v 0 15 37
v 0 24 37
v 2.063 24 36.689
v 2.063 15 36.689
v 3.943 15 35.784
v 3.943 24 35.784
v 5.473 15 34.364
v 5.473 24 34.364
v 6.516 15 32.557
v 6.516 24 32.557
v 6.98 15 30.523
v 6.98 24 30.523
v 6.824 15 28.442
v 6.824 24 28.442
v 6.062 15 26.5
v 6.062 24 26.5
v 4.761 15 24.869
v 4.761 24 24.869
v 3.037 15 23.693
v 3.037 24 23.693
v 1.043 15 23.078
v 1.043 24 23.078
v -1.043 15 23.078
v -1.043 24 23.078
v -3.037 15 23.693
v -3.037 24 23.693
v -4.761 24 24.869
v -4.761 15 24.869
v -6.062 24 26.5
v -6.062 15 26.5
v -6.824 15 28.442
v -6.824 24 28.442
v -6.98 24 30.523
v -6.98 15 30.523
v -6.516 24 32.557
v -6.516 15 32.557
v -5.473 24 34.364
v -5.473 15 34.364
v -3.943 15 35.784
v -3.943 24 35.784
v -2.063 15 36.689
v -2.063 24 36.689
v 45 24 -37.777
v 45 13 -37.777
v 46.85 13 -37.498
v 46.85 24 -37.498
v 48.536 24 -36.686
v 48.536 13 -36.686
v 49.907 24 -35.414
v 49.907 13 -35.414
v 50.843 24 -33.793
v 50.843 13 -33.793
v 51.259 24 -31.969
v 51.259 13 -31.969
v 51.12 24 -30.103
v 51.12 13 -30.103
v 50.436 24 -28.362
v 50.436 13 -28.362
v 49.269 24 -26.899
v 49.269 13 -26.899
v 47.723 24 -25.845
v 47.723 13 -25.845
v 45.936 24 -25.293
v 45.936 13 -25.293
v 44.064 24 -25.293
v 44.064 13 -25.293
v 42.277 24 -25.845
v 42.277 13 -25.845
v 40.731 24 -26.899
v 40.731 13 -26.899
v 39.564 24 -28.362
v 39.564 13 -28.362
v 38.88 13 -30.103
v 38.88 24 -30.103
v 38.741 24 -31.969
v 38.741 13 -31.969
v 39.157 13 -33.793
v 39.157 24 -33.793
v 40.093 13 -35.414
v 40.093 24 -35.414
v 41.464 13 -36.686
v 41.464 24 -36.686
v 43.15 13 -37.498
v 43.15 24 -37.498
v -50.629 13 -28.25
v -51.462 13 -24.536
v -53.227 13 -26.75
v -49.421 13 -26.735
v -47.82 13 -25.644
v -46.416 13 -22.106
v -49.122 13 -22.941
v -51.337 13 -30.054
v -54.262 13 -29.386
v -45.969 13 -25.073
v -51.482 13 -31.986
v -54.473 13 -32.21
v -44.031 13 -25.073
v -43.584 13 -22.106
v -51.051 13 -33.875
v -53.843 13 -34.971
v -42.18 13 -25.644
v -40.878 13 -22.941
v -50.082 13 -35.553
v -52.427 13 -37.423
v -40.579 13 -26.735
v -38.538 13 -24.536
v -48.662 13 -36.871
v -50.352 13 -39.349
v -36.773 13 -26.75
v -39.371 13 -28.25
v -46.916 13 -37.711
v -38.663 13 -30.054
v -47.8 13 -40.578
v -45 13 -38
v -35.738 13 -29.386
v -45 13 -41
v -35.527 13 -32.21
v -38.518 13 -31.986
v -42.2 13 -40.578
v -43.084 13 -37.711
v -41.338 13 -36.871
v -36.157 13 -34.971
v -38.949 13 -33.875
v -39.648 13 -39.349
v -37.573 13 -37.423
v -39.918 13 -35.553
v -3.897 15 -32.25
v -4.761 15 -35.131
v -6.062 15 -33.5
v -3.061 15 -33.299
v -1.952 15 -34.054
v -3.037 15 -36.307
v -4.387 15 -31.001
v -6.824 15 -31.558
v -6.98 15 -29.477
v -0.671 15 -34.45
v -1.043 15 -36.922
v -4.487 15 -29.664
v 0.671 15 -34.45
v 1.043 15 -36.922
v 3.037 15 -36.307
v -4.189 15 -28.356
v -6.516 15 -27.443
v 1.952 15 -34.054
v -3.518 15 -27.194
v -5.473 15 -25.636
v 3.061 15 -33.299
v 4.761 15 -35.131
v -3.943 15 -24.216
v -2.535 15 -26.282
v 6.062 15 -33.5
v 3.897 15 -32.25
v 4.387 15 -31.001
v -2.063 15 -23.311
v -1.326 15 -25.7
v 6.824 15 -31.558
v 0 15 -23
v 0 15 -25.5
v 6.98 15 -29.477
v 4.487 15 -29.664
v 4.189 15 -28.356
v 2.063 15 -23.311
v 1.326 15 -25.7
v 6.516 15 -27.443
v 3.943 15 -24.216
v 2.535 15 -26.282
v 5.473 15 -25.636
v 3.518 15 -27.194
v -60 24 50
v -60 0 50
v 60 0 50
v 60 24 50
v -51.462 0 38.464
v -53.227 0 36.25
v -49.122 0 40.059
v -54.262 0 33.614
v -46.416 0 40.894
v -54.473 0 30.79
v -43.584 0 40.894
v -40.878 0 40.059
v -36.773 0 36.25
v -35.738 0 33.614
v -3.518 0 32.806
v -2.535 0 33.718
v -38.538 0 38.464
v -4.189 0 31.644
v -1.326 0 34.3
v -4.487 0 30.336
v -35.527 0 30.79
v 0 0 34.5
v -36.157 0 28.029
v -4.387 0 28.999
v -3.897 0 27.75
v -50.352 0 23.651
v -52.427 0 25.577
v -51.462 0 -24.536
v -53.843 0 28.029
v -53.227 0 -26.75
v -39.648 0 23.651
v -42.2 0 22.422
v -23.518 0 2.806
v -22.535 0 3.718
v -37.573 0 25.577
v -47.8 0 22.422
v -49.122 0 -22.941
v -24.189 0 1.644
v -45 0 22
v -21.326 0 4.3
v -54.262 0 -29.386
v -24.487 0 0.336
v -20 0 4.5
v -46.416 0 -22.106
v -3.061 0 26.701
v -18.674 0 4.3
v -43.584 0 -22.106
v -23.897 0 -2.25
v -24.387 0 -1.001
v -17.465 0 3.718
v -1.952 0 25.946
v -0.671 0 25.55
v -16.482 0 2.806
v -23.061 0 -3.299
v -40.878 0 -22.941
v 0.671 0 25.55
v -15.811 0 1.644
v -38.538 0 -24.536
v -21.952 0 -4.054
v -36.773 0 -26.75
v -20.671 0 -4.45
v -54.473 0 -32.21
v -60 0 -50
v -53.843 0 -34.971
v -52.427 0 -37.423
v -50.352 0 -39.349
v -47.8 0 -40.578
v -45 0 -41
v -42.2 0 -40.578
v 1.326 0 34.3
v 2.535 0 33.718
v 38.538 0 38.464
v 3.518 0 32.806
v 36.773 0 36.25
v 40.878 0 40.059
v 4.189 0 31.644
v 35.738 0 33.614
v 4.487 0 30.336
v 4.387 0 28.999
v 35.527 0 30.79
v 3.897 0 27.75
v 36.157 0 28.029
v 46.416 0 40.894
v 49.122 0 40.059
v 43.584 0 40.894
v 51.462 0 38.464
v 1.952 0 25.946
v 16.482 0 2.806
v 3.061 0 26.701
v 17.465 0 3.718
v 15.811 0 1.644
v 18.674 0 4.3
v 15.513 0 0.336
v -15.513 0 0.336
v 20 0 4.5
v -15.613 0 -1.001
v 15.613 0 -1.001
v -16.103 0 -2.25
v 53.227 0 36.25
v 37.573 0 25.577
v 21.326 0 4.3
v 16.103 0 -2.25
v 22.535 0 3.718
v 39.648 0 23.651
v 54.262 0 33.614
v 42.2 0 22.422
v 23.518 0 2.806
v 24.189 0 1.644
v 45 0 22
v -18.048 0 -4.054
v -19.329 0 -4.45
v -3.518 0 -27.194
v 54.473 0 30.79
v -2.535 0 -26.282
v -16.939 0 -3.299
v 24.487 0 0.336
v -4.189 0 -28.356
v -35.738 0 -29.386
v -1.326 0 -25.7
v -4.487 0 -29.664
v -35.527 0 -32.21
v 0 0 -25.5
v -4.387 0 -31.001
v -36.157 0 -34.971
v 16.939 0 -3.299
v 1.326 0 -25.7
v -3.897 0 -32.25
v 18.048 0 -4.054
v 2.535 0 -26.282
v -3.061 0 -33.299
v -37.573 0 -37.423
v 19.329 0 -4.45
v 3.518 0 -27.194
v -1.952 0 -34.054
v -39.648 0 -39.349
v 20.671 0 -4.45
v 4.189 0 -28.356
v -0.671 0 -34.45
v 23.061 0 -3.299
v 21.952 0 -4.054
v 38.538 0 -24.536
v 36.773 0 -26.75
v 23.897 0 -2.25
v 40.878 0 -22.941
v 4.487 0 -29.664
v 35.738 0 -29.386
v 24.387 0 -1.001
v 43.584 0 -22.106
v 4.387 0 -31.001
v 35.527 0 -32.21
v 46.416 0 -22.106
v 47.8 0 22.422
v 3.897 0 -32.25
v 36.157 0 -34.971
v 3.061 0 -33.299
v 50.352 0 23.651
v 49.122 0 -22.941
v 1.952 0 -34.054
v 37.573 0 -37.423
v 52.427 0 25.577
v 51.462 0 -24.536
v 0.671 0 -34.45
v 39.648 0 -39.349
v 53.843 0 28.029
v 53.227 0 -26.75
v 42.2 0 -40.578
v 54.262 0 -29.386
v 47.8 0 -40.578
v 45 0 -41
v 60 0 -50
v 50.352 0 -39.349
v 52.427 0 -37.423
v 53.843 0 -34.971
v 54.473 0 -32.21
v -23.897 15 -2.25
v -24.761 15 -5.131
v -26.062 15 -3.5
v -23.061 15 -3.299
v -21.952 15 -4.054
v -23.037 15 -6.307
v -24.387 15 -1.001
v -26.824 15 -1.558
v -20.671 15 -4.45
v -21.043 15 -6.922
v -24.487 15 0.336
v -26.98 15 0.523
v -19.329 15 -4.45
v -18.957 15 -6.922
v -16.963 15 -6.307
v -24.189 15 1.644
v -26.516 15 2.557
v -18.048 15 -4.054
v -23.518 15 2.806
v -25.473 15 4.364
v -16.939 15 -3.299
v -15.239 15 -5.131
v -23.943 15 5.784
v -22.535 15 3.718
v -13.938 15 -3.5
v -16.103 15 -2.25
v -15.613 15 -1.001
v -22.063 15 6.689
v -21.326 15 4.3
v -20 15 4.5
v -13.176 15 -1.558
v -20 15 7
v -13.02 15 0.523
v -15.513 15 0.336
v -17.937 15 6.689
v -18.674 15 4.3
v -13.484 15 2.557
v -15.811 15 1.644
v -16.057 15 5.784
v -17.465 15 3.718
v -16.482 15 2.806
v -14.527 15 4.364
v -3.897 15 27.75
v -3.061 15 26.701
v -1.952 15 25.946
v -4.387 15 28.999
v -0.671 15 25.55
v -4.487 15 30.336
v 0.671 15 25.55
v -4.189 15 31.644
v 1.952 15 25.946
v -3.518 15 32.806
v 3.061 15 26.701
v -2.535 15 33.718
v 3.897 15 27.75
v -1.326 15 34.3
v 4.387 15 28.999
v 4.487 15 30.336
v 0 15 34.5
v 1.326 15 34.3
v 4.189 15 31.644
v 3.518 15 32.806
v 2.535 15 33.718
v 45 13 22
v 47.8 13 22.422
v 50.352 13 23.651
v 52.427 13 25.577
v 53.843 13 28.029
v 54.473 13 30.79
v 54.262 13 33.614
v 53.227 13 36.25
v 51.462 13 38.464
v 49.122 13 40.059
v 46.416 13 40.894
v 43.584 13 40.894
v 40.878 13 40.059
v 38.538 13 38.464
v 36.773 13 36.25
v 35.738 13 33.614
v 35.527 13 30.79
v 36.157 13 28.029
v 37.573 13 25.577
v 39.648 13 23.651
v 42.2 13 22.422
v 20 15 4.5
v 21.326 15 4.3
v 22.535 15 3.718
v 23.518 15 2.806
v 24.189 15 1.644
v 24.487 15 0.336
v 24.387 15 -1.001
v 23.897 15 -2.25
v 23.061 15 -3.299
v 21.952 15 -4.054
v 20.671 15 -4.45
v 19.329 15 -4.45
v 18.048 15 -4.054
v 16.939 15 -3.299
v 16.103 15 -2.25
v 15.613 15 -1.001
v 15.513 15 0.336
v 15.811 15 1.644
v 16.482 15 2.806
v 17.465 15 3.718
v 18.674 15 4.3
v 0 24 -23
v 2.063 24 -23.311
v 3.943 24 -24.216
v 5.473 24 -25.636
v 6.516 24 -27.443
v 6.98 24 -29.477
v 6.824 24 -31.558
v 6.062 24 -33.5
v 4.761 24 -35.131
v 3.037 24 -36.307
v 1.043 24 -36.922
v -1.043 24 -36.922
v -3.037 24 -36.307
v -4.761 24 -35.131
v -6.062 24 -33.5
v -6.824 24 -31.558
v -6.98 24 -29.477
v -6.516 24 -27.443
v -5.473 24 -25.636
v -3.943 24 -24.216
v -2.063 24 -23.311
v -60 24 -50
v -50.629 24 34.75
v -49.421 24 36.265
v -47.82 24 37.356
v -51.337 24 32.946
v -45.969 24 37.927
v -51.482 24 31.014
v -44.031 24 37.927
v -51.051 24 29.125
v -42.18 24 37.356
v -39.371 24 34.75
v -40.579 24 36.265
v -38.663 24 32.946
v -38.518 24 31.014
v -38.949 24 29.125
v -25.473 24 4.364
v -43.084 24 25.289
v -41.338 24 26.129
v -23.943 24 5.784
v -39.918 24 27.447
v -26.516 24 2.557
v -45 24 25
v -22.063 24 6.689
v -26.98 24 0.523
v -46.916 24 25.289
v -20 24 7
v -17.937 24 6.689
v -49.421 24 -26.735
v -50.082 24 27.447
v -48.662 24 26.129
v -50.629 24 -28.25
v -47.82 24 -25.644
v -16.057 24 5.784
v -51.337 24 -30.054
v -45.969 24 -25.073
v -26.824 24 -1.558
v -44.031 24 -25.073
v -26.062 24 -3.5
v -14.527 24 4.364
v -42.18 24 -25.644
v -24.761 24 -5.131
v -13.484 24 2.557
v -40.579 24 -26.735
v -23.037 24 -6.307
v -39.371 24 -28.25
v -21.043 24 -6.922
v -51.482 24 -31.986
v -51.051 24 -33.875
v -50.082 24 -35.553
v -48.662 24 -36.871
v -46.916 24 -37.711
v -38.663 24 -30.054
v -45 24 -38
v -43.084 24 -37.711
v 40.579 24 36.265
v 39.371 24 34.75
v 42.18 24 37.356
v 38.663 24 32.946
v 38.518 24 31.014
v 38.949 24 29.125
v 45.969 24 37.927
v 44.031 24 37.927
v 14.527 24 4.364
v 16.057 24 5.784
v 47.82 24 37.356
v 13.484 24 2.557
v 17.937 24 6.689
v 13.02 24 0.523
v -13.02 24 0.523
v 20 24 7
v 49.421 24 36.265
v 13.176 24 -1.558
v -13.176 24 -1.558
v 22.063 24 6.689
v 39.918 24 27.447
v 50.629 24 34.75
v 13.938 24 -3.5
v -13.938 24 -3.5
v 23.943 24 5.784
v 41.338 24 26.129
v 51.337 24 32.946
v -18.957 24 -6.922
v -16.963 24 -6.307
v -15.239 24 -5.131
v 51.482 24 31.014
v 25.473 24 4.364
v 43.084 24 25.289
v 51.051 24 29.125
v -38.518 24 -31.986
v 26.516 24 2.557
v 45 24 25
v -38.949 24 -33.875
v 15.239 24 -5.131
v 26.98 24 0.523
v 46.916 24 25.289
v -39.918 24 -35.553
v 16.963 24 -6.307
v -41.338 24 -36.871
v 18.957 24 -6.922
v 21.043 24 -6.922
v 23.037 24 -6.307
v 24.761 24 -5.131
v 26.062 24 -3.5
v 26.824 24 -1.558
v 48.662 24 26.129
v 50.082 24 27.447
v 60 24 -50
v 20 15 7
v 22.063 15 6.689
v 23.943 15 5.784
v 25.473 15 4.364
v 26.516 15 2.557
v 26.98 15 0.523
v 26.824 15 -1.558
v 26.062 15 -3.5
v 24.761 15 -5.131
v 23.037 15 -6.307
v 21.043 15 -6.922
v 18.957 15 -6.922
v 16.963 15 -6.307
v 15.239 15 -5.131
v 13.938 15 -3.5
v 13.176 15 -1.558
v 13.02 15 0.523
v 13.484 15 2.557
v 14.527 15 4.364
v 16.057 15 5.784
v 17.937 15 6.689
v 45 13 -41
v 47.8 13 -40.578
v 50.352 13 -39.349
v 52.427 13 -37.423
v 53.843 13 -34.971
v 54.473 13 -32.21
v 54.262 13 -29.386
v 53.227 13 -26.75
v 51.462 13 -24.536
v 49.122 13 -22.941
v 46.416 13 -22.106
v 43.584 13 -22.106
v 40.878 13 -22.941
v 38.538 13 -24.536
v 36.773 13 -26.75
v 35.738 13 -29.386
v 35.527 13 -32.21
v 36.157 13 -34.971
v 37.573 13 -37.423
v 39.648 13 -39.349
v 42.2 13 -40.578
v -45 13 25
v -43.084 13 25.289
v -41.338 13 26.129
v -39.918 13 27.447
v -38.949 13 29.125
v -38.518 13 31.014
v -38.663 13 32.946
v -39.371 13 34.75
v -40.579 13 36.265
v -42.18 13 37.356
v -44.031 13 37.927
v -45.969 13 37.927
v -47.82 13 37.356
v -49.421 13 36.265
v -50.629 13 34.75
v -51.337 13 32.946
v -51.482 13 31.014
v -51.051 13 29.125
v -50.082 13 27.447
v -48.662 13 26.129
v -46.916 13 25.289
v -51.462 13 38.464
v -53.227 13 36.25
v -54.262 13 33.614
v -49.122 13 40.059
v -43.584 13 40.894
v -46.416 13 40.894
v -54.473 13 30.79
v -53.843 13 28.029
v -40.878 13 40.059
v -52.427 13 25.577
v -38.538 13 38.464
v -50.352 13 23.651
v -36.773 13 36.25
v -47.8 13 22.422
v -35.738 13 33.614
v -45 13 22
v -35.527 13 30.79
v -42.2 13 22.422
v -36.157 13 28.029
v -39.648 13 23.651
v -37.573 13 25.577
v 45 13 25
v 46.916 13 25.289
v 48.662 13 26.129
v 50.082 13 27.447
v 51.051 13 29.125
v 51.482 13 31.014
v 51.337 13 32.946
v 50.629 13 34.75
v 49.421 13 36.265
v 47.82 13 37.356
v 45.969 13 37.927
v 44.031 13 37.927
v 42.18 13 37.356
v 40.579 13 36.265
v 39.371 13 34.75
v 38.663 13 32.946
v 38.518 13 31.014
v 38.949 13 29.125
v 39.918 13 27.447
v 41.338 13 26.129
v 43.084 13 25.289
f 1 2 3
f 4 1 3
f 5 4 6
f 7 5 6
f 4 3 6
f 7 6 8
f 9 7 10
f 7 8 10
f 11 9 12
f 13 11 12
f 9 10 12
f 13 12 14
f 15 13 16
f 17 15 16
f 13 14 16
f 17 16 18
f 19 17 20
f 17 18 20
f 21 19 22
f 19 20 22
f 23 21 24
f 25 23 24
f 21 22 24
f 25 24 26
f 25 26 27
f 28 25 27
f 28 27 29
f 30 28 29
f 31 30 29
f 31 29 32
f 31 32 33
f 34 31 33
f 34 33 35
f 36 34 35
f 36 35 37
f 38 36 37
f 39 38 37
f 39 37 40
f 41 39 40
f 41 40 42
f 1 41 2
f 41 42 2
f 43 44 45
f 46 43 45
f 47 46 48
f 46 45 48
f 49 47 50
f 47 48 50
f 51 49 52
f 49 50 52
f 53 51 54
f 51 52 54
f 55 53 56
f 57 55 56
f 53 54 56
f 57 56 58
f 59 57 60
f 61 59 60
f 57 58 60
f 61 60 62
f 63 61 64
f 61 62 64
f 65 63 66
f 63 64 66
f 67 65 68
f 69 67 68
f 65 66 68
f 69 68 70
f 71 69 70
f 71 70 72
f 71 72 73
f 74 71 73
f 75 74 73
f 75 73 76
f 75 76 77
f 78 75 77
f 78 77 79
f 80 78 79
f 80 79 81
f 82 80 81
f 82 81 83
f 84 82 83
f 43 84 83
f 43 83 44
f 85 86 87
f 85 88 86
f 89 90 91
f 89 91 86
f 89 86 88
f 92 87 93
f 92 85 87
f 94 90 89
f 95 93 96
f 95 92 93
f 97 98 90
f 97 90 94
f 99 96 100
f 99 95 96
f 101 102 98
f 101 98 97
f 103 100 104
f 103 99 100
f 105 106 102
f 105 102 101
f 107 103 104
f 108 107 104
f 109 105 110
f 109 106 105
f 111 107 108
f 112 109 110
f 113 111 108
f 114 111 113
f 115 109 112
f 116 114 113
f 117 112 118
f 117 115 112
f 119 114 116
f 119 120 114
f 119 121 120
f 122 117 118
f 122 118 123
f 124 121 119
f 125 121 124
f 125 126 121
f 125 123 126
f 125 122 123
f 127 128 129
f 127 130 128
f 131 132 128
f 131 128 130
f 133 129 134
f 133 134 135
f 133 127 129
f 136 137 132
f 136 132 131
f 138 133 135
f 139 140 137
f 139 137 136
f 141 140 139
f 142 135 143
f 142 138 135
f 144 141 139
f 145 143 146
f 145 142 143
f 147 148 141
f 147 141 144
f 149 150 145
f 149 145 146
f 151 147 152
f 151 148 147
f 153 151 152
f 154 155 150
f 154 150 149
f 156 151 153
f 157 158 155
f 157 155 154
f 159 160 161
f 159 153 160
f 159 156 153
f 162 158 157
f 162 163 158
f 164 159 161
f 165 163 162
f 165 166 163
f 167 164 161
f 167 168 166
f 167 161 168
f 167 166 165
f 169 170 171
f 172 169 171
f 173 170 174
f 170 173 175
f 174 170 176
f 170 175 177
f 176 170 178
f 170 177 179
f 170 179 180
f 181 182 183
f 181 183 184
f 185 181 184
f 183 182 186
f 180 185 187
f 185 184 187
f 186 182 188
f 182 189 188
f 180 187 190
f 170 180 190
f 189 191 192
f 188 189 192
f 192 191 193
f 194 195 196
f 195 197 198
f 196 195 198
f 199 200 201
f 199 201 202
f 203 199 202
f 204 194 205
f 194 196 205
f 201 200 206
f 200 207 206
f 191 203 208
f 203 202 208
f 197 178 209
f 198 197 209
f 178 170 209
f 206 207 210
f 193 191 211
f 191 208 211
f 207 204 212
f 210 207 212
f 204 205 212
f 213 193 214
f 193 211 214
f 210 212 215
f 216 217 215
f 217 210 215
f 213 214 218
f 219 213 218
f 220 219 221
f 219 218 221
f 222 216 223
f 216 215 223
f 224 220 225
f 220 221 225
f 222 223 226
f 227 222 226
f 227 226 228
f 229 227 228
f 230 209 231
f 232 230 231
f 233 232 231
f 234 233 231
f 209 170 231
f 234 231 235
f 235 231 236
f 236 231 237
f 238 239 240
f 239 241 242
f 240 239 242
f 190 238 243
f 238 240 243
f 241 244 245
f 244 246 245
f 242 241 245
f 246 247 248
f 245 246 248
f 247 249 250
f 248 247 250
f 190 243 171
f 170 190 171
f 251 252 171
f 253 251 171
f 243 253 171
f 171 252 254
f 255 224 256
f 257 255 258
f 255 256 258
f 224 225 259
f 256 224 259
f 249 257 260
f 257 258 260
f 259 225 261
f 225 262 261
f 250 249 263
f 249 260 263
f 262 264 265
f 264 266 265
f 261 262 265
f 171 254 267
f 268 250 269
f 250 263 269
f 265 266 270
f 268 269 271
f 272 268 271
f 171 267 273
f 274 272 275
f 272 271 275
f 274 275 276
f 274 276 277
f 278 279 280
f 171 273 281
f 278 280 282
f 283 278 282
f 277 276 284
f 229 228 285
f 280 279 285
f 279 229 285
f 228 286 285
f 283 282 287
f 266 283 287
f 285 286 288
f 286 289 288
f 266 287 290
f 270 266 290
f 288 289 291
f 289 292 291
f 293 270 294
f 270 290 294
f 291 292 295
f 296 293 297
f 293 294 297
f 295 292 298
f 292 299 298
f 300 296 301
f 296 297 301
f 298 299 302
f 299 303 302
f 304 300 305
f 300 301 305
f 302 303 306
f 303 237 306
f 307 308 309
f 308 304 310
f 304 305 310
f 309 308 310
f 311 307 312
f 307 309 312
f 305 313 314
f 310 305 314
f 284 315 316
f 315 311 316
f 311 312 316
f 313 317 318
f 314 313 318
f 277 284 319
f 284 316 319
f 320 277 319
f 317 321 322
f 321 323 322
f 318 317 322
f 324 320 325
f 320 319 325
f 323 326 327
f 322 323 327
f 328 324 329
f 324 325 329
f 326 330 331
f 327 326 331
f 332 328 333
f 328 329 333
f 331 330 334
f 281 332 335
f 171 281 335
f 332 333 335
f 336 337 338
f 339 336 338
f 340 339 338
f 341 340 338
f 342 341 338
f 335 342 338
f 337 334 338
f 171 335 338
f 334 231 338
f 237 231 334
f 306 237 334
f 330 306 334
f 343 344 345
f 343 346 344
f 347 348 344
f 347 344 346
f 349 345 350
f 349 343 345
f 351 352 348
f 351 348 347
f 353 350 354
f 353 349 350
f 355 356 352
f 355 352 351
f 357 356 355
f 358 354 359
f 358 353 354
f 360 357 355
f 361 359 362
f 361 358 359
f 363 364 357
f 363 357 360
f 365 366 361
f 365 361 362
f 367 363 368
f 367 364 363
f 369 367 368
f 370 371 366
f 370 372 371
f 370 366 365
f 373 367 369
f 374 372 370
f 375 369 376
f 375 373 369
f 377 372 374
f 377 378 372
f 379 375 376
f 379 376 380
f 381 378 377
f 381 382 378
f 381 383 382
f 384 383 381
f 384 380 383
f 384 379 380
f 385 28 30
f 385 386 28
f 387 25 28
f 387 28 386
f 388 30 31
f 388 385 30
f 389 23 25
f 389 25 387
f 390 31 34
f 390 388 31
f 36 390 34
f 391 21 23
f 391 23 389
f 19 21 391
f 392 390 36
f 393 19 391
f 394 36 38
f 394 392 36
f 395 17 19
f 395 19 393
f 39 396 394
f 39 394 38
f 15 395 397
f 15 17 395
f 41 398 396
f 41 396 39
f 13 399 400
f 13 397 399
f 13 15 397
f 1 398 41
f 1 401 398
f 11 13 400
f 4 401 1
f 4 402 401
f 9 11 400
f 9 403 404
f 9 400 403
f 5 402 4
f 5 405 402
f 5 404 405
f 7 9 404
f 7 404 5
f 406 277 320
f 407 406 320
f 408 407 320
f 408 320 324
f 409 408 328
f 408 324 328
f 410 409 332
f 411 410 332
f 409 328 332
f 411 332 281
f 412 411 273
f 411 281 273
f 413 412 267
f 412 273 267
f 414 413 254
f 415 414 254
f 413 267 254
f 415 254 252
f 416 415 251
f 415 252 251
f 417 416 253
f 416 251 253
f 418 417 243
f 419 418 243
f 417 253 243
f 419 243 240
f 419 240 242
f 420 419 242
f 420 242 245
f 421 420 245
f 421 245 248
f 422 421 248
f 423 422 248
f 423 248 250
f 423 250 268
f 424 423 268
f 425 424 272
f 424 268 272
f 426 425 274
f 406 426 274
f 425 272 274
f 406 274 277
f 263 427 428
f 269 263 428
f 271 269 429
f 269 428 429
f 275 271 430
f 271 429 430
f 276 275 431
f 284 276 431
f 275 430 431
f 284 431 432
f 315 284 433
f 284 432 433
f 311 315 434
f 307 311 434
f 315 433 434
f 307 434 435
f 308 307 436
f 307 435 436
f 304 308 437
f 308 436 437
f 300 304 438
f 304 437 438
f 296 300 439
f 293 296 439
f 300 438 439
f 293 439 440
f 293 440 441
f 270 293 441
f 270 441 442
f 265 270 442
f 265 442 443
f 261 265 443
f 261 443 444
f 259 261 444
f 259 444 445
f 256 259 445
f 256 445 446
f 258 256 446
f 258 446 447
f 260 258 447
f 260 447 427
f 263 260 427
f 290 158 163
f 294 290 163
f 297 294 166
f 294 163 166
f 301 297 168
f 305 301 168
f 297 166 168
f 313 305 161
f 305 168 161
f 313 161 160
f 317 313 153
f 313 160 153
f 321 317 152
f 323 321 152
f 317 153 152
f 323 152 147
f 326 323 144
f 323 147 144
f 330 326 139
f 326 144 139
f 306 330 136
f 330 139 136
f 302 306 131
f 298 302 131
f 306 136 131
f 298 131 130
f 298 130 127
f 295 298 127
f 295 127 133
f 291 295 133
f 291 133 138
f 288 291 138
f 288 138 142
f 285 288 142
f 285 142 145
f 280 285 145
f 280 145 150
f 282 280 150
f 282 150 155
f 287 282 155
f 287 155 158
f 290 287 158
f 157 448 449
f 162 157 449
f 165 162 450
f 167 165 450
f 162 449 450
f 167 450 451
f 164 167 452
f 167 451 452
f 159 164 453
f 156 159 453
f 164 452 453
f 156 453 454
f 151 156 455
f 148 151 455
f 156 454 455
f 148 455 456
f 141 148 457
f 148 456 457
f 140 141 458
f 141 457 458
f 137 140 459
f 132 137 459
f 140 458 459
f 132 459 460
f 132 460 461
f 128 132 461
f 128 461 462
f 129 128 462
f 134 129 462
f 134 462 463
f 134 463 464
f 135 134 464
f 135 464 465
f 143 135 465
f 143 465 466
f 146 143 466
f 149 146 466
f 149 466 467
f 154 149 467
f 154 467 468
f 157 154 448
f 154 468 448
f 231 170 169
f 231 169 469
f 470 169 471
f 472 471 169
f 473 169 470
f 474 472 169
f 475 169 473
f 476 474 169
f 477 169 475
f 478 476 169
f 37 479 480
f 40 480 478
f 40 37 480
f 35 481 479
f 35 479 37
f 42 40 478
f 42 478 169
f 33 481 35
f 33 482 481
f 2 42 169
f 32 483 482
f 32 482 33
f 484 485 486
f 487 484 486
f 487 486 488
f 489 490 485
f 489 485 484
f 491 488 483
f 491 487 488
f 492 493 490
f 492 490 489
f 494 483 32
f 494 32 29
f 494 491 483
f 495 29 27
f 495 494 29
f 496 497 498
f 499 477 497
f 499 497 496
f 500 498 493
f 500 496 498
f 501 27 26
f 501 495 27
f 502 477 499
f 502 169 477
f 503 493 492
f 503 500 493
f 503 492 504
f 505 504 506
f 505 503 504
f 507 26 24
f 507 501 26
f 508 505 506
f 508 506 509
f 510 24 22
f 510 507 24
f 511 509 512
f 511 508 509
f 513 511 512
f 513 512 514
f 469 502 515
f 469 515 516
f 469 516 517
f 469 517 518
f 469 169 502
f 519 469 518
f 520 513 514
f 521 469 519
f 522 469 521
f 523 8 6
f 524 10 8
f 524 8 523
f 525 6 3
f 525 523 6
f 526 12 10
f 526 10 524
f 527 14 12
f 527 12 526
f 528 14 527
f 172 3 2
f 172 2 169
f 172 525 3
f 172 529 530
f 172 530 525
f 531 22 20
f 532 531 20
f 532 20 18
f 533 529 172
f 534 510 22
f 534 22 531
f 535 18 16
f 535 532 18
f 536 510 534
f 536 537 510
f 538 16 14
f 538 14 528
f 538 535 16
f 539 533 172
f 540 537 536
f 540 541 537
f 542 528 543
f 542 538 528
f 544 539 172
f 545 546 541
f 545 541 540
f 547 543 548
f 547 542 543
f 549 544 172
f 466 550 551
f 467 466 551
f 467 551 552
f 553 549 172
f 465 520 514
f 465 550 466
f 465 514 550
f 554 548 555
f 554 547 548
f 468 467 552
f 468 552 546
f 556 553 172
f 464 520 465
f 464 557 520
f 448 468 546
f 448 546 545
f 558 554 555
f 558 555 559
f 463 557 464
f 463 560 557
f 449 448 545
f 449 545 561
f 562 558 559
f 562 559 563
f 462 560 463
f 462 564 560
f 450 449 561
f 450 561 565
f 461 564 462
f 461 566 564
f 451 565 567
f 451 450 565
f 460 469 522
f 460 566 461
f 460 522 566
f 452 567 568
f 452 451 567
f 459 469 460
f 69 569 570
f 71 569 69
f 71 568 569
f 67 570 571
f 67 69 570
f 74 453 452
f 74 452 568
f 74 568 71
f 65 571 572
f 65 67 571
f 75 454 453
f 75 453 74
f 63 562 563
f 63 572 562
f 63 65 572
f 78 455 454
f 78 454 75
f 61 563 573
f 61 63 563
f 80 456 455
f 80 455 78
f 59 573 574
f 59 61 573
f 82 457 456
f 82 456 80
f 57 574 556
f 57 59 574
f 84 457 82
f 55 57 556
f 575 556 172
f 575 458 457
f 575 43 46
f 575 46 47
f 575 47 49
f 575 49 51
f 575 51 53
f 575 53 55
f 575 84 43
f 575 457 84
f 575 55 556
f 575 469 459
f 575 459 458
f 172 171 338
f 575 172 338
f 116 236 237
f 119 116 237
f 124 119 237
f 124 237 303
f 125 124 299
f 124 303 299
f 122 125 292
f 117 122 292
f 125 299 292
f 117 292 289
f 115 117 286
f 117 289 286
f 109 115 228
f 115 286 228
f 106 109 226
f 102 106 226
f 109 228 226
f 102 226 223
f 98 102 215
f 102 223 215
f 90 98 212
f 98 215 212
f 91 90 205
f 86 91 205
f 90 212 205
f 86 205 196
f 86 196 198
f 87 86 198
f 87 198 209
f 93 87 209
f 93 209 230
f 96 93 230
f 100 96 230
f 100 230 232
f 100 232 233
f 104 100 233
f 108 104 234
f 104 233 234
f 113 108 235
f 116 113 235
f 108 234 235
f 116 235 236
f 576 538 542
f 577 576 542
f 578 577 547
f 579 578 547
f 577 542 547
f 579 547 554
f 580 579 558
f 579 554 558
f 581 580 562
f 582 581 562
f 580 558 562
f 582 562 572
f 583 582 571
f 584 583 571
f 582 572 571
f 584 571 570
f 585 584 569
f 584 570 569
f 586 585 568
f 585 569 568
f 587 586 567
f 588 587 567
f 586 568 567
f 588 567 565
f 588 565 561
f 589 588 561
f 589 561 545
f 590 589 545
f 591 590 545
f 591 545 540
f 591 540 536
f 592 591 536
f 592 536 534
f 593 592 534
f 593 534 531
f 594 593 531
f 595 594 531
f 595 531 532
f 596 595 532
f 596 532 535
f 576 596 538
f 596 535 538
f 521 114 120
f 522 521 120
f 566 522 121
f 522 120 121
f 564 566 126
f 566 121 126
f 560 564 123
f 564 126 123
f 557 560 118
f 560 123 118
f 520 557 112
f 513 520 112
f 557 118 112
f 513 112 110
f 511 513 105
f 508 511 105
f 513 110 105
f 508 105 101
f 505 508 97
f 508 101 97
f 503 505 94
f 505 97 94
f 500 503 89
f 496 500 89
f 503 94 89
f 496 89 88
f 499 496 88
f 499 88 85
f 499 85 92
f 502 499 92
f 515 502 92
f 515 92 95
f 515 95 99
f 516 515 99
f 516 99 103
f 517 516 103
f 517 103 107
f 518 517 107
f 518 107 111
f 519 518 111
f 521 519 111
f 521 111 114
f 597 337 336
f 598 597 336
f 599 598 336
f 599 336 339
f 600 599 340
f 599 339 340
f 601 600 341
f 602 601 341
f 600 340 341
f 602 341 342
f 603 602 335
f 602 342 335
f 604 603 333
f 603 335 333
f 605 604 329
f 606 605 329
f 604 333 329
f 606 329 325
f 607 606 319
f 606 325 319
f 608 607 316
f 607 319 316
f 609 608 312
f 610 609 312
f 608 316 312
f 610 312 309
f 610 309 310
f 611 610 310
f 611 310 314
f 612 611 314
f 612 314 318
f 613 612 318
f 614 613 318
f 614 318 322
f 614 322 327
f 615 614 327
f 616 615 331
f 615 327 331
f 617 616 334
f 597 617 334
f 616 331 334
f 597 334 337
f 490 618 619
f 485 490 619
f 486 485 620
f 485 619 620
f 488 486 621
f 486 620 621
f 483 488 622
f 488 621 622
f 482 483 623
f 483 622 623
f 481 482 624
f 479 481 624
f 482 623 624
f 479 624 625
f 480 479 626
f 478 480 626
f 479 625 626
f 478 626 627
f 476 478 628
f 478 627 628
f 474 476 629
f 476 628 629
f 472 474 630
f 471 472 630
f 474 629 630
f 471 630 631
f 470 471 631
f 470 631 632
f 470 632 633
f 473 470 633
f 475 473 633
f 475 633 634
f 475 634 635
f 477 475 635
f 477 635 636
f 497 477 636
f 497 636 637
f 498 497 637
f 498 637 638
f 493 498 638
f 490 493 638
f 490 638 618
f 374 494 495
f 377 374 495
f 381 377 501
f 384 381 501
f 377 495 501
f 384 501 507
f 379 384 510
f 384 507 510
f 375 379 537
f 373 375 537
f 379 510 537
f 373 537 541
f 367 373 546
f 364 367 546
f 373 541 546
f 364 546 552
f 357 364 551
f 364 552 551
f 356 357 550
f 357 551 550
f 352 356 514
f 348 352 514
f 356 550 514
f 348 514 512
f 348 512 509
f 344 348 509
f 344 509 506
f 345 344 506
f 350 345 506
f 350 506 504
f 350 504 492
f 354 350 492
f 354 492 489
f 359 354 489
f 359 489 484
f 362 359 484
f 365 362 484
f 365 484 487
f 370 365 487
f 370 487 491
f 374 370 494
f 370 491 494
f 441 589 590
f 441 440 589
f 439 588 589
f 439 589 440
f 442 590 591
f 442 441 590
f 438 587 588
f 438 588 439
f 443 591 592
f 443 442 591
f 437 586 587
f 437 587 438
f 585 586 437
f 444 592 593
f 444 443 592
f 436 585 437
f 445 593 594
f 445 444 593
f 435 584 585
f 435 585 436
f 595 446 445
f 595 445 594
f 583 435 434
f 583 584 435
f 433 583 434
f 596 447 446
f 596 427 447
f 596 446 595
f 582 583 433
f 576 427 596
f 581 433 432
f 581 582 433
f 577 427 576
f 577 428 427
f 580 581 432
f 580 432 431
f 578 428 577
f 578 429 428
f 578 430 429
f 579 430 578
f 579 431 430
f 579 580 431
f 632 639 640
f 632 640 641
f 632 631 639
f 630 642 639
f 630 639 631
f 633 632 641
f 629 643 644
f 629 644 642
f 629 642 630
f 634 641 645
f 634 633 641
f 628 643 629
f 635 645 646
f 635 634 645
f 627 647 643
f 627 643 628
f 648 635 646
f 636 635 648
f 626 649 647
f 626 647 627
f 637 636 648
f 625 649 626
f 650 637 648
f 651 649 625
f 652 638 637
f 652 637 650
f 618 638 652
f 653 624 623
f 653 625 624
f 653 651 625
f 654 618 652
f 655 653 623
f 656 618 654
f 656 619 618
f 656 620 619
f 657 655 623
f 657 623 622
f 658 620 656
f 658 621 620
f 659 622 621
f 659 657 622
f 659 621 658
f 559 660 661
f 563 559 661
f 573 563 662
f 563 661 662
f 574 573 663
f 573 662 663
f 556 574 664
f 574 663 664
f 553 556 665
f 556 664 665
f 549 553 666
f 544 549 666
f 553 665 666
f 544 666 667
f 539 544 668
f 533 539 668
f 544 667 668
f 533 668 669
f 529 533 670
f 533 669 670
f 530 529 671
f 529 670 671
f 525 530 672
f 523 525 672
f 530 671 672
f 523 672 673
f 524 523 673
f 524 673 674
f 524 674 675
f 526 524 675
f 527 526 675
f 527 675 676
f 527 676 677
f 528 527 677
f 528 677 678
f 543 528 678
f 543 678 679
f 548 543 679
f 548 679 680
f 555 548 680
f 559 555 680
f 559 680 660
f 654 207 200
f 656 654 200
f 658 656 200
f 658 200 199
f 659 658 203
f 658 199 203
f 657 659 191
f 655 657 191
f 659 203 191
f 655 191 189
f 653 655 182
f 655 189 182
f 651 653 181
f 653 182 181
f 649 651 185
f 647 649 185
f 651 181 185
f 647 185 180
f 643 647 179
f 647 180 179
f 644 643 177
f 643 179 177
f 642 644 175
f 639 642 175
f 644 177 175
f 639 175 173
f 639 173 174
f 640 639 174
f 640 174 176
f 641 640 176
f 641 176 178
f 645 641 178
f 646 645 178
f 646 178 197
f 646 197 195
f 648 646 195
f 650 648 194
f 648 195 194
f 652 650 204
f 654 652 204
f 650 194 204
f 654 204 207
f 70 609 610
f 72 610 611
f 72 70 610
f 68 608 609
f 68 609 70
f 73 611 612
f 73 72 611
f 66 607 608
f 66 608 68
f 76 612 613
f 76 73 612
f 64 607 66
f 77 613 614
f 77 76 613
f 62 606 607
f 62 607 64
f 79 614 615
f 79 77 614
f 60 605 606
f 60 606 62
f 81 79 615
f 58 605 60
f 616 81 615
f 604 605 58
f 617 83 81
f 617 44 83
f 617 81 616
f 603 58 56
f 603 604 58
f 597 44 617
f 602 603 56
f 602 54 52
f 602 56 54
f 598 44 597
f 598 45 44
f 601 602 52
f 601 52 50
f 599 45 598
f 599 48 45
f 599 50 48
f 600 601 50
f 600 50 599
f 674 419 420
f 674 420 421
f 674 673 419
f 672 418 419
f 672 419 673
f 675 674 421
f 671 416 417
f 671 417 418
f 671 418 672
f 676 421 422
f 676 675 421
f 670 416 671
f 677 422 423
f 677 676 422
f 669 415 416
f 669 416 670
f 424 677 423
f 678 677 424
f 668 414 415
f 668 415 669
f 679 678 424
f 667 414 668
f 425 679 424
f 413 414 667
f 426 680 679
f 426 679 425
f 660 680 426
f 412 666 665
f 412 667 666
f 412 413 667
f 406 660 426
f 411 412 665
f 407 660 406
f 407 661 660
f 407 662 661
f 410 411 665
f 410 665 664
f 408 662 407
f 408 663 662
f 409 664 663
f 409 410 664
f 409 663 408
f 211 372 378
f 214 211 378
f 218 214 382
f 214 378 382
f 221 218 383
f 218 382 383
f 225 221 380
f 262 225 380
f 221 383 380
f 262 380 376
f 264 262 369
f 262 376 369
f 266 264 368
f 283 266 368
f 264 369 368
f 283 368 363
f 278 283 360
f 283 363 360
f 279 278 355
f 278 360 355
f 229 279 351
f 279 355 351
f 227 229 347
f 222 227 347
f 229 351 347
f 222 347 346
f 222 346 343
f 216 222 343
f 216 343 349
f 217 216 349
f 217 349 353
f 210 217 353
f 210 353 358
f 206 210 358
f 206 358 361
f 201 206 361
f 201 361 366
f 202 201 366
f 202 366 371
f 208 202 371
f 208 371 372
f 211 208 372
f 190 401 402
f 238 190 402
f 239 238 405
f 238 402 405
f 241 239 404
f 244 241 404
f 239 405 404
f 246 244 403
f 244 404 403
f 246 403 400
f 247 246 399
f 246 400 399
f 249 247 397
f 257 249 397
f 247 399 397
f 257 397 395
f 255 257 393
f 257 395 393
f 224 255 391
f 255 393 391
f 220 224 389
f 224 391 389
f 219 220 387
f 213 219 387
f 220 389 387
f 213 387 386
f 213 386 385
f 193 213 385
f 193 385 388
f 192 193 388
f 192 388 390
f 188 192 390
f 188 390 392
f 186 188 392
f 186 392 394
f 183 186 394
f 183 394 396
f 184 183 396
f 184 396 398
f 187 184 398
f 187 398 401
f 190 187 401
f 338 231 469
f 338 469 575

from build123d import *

# Parameters (mm, degrees)
CROQUIS1_W              = 120
CROQUIS1_H              = 100
SALIENTE_EXTRUIR1_DEPTH = 24
CROQUIS2_R              = 7
CORTAR_EXTRUIR1_DEPTH   = 9
CORTAR_EXTRUIR2_REACH   = 81.53
CROQUIS3_R              = 4.5
CROQUIS4_R              = 9.5
CORTAR_EXTRUIR3_DEPTH   = 13
CROQUIS5_R              = 6.5
CROQUIS5_R_2            = 6.276895532
CORTAR_EXTRUIR4_DEPTH   = 80.177016867


with BuildPart() as part:
    # Croquis1 → Saliente-Extruir1 (new body)
    with BuildSketch(Plane(origin=(0, 0, 0), x_dir=(1, 0, 0), z_dir=(0, 1, 0))):
        Rectangle(CROQUIS1_W, CROQUIS1_H)
    extrude(amount=SALIENTE_EXTRUIR1_DEPTH)

    # Croquis2 → Cortar-Extruir1 (cut)
    with BuildSketch(Plane(origin=(0, 24, 0), x_dir=(1, 0, 0), z_dir=(0, 1, 0))):
        with Locations(Location((0, 30, 0), (0, 0, 270))):
            Circle(CROQUIS2_R)
        with Locations(Location((0, -30, 0), (0, 0, 270))):
            Circle(CROQUIS2_R)
        with Locations(Location((-20, 0, 0), (0, 0, 270))):
            Circle(CROQUIS2_R)
        with Locations(Location((20, 0, 0), (0, 0, 270))):
            Circle(CROQUIS2_R)
    extrude(amount=-CORTAR_EXTRUIR1_DEPTH, mode=Mode.SUBTRACT)

    # Croquis3 → Cortar-Extruir2 (cut, up to next)
    with BuildSketch(Plane(origin=(0, 15, 0), x_dir=(1, 0, 0), z_dir=(0, 1, 0)), mode=Mode.PRIVATE) as cortar_extruir2_sk1:
        with Locations(Location((-20, 0, 0), (0, 0, 270))):
            Circle(CROQUIS3_R)
    cortar_extruir2_tool1 = extrude(cortar_extruir2_sk1.sketch, amount=-CORTAR_EXTRUIR2_REACH, mode=Mode.PRIVATE) & part.part
    # Croquis3 → Cortar-Extruir2 (cut, up to next)
    with BuildSketch(Plane(origin=(0, 15, 0), x_dir=(1, 0, 0), z_dir=(0, 1, 0)), mode=Mode.PRIVATE) as cortar_extruir2_sk2:
        with Locations(Location((0, 30, 0), (0, 0, 270))):
            Circle(CROQUIS3_R)
    cortar_extruir2_tool2 = extrude(cortar_extruir2_sk2.sketch, amount=-CORTAR_EXTRUIR2_REACH, mode=Mode.PRIVATE) & part.part
    # Croquis3 → Cortar-Extruir2 (cut, up to next)
    with BuildSketch(Plane(origin=(0, 15, 0), x_dir=(1, 0, 0), z_dir=(0, 1, 0)), mode=Mode.PRIVATE) as cortar_extruir2_sk3:
        with Locations(Location((20, 0, 0), (0, 0, 270))):
            Circle(CROQUIS3_R)
    cortar_extruir2_tool3 = extrude(cortar_extruir2_sk3.sketch, amount=-CORTAR_EXTRUIR2_REACH, mode=Mode.PRIVATE) & part.part
    # Croquis3 → Cortar-Extruir2 (cut, up to next)
    with BuildSketch(Plane(origin=(0, 15, 0), x_dir=(1, 0, 0), z_dir=(0, 1, 0)), mode=Mode.PRIVATE) as cortar_extruir2_sk4:
        with Locations(Location((0, -30, 0), (0, 0, 270))):
            Circle(CROQUIS3_R)
    cortar_extruir2_tool4 = extrude(cortar_extruir2_sk4.sketch, amount=-CORTAR_EXTRUIR2_REACH, mode=Mode.PRIVATE) & part.part
    add(cortar_extruir2_tool1.solids().sort_by_distance((-20, 15, 0))[0], mode=Mode.SUBTRACT)
    add(cortar_extruir2_tool2.solids().sort_by_distance((0, 15, -30))[0], mode=Mode.SUBTRACT)
    add(cortar_extruir2_tool3.solids().sort_by_distance((20, 15, 0))[0], mode=Mode.SUBTRACT)
    add(cortar_extruir2_tool4.solids().sort_by_distance((0, 15, 30))[0], mode=Mode.SUBTRACT)

    # Croquis4 → Cortar-Extruir3 (cut)
    with BuildSketch(Plane.XZ):
        with Locations(Location((-45, 31.5, 0), (0, 0, 270))):
            Circle(CROQUIS4_R)
        with Locations(Location((45, 31.5, 0), (0, 0, 270))):
            Circle(CROQUIS4_R)
        with Locations(Location((45, -31.5, 0), (0, 0, 270))):
            Circle(CROQUIS4_R)
        with Locations(Location((-45, -31.5, 0), (0, 0, 270))):
            Circle(CROQUIS4_R)
    extrude(amount=-CORTAR_EXTRUIR3_DEPTH, mode=Mode.SUBTRACT)

    # Croquis5 → Cortar-Extruir4 (cut, through all)
    with BuildSketch(Plane.XZ.offset(-13)):
        with Locations(Location((-45, 31.5, 0), (0, 0, 270))):
            Circle(CROQUIS5_R)
        with Locations(Location((45, 31.5, 0), (0, 0, 270))):
            Circle(CROQUIS5_R)
        with Locations(Location((-45, -31.5, 0), (0, 0, 270))):
            Circle(CROQUIS5_R)
        with Locations(Location((45, -31.5, 0), (0, 0, 270))):
            Circle(CROQUIS5_R_2)
    extrude(amount=-CORTAR_EXTRUIR4_DEPTH, mode=Mode.SUBTRACT)


solid = part.part
